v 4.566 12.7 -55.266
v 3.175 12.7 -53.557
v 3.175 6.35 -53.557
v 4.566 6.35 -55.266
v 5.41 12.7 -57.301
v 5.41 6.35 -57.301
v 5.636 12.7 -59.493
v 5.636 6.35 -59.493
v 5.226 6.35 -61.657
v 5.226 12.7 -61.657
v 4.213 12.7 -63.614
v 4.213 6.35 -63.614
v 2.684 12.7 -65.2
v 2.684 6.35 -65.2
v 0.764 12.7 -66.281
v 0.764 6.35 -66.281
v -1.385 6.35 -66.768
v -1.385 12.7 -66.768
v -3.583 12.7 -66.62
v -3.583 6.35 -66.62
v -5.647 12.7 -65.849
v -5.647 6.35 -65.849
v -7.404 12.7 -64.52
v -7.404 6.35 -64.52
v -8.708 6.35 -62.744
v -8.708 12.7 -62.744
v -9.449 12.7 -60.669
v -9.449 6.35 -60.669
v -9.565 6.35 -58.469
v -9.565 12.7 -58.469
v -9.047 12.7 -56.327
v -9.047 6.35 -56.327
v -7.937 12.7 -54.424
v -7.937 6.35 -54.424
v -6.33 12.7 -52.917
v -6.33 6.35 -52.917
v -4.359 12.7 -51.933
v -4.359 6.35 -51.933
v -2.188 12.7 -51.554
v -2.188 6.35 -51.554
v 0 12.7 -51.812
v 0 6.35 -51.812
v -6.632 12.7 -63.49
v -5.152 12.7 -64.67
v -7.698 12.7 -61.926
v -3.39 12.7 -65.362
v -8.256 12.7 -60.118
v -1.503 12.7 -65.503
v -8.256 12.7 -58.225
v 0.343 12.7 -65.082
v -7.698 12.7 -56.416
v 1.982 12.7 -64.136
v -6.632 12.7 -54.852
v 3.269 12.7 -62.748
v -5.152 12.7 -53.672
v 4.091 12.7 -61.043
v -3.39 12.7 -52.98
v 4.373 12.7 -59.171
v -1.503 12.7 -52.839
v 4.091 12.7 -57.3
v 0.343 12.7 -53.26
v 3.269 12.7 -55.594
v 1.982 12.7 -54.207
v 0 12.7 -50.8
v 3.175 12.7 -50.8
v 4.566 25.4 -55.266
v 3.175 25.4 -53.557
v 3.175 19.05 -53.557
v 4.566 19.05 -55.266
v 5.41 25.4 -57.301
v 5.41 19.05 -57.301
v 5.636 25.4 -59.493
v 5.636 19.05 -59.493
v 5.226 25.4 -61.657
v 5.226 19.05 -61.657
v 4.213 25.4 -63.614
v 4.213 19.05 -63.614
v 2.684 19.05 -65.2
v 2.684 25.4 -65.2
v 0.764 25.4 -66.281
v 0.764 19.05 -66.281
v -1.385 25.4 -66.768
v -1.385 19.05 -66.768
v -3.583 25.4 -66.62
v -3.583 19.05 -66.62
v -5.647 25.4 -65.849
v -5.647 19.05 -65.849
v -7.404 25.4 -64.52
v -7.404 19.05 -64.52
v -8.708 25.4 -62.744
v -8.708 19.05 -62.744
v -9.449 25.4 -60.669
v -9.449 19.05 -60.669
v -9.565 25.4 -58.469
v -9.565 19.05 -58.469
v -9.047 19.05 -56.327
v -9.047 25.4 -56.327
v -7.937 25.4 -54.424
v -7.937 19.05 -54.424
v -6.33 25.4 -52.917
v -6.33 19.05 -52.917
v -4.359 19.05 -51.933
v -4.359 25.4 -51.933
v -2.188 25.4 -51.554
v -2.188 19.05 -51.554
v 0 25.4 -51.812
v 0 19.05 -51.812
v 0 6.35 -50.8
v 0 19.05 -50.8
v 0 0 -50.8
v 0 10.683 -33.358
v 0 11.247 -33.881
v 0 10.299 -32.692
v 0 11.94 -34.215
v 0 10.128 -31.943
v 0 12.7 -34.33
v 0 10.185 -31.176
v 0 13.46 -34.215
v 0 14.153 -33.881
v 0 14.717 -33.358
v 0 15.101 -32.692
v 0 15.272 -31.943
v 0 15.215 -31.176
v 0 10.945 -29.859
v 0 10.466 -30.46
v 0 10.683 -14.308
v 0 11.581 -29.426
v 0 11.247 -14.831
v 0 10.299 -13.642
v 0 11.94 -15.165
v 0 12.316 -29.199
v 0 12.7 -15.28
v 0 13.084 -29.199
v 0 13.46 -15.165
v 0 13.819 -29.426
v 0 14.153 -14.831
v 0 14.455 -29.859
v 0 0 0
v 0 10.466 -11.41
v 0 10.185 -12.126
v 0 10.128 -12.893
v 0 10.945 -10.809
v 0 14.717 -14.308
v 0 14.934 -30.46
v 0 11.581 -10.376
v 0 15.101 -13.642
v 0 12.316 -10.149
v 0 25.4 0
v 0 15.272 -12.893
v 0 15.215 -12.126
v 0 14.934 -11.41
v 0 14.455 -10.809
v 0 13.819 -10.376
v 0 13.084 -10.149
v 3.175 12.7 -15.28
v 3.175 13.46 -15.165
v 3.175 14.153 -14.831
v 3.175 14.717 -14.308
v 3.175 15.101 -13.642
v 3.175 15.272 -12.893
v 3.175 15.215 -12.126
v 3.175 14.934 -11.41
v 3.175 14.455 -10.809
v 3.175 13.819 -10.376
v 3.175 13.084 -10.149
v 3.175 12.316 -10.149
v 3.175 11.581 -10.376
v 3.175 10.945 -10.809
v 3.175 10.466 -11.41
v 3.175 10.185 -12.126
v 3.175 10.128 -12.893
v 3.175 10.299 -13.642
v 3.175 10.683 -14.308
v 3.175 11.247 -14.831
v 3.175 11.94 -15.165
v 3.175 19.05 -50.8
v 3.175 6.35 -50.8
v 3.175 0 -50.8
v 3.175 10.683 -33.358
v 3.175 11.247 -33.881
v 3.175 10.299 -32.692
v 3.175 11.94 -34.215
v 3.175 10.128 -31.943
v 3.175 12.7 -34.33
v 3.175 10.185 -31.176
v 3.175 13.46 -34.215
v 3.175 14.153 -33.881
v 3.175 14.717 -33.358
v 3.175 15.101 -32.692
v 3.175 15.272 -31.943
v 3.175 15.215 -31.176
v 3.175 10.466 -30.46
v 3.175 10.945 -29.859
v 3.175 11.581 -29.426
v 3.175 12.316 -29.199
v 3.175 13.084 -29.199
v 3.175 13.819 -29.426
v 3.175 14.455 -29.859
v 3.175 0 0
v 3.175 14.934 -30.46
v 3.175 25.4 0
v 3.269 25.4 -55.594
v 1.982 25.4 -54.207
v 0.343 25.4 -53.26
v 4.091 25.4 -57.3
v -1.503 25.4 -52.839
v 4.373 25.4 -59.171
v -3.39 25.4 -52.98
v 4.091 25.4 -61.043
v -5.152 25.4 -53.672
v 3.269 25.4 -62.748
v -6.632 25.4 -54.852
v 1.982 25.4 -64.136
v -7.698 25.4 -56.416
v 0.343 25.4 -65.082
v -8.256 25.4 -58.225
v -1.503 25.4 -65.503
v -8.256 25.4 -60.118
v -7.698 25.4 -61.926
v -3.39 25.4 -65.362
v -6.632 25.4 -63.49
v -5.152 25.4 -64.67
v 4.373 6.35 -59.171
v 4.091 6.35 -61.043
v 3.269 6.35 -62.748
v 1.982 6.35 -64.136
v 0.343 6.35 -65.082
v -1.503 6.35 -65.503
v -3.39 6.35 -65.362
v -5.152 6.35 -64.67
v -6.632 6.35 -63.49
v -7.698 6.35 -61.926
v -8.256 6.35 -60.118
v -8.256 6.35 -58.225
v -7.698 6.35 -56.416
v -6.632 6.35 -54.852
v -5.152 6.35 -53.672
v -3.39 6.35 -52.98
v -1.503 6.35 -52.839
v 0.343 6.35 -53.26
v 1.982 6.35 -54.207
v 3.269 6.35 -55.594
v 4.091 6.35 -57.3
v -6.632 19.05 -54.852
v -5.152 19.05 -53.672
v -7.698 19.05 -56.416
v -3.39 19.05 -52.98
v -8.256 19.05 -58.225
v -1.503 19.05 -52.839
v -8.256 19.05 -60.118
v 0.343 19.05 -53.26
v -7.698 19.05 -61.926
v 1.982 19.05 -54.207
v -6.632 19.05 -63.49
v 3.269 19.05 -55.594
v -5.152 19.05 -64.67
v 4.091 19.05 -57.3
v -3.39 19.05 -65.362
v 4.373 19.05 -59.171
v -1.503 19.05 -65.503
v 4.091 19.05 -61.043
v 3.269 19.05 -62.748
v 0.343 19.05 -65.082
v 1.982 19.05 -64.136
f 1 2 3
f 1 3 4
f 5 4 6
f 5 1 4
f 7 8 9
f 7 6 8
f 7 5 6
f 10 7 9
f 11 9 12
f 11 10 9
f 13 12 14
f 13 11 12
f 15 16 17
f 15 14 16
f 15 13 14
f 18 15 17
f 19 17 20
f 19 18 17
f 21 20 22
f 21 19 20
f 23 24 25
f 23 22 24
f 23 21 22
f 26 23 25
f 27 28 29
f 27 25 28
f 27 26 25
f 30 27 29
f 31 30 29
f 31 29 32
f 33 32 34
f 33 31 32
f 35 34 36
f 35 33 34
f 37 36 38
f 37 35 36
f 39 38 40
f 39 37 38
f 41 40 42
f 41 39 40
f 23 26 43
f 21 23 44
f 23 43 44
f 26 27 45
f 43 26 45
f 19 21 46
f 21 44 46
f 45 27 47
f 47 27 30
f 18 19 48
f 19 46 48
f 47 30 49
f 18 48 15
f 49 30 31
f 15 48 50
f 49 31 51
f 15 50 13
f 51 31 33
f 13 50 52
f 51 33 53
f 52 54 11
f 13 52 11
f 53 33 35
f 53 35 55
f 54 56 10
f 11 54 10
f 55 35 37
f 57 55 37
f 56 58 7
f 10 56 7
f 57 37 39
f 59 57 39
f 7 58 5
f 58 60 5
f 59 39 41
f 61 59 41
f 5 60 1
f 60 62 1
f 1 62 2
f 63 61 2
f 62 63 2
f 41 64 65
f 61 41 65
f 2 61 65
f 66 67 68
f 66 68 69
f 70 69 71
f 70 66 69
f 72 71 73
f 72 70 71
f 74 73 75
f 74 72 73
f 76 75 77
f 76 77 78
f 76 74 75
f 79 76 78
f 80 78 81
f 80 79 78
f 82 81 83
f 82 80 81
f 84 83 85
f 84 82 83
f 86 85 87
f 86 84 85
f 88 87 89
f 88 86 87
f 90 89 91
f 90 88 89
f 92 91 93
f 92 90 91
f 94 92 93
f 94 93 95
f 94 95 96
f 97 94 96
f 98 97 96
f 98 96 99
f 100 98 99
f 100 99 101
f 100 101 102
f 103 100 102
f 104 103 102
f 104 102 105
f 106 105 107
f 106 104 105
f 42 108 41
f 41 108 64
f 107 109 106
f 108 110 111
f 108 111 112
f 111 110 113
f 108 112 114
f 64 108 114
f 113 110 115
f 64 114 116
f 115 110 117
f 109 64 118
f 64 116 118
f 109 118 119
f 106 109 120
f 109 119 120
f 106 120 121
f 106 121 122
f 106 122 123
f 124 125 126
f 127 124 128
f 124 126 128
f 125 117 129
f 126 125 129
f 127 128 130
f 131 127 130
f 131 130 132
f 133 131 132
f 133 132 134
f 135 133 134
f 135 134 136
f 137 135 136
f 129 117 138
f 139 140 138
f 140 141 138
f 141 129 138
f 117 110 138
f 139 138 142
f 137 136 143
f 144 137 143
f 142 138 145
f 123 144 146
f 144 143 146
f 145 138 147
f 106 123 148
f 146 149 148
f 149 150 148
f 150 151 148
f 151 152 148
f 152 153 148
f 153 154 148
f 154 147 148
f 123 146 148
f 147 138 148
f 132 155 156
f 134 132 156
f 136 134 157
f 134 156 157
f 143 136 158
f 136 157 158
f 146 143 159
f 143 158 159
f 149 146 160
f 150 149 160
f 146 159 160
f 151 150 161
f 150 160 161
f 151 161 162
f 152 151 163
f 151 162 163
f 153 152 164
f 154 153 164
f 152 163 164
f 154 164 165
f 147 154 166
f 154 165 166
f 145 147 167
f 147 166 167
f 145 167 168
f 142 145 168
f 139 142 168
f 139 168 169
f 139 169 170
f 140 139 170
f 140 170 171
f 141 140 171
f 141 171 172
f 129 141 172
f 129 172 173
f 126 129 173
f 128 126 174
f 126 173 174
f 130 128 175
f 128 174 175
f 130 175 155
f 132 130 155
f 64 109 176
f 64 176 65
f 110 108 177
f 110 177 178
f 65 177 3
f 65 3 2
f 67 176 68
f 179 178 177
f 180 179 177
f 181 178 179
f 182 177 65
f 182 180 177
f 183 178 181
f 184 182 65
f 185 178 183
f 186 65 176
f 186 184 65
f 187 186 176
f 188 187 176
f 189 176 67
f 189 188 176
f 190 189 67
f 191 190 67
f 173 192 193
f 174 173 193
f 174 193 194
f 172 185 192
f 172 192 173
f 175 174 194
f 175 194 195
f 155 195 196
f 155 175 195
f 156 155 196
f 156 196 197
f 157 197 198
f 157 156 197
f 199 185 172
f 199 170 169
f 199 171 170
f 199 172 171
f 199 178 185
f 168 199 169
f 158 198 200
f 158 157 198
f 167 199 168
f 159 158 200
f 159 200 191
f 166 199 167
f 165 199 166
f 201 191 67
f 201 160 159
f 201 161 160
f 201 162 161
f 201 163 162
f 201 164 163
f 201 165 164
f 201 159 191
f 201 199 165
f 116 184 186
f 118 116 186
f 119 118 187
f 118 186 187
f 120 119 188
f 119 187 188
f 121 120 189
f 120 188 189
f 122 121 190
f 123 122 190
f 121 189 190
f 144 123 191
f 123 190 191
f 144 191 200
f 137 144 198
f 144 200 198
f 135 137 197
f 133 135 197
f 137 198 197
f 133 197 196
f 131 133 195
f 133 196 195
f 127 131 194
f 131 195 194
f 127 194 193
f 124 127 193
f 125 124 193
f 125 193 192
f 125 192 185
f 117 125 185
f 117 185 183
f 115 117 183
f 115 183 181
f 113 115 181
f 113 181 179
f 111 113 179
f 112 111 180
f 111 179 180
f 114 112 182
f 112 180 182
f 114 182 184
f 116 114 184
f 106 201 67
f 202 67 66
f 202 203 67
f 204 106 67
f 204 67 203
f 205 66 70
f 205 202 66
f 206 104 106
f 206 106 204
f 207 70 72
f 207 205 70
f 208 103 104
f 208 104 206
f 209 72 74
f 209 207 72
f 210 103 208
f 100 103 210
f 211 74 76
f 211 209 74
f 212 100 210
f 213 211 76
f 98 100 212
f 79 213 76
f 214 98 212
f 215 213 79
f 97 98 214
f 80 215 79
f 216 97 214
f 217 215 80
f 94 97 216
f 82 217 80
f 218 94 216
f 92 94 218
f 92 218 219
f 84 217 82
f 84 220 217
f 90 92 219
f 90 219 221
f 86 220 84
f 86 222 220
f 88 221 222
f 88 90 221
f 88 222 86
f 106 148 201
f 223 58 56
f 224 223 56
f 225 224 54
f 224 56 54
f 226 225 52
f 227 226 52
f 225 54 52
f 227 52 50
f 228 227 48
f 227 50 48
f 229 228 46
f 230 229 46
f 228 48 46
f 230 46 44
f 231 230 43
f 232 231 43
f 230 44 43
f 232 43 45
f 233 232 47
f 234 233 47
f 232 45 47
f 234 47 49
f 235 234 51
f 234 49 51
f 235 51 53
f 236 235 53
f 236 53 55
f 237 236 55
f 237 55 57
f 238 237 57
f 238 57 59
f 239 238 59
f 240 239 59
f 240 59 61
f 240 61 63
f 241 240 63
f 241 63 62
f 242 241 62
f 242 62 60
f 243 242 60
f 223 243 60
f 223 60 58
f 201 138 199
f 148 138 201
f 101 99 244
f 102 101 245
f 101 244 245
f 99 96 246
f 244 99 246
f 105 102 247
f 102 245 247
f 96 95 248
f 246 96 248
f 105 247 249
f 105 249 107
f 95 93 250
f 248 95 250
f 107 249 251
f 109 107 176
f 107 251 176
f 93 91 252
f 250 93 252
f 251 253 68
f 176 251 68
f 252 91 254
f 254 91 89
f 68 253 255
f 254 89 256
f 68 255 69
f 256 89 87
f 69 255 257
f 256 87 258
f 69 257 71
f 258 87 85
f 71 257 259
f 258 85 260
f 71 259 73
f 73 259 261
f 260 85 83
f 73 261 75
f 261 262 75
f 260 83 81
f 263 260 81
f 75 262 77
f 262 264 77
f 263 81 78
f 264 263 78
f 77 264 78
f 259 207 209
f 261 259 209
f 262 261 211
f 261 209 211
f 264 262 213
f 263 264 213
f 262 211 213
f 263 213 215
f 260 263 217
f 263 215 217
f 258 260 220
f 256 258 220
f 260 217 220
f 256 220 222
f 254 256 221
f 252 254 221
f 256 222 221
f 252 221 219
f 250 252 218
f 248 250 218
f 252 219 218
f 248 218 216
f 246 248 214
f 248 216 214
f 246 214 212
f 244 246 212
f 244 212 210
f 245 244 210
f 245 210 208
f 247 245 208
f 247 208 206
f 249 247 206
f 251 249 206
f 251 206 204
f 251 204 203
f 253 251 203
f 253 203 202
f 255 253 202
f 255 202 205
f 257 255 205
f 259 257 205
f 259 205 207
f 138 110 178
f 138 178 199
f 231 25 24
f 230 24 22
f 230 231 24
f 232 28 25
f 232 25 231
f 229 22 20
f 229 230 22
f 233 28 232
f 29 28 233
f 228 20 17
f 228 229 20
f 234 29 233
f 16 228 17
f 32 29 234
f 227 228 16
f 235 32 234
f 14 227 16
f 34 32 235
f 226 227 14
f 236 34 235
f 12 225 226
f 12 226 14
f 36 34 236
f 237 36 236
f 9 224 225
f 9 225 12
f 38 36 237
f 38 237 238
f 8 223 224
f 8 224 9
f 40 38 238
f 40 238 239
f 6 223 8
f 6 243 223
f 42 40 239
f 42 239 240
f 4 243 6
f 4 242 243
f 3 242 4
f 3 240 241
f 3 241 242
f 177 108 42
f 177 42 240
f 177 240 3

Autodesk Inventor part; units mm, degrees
ref_plane "YZ Plane" through (0, 0, 0) normal (1, 0, 0) x (0, 1, 0)
ref_plane "XZ Plane" through (0, 0, 0) normal (0, 1, 0) x (-1, 0, 0)
sketch "Sketch1" plane through (0, 0, 0) normal (1, 0, 0) x (0, 1, 0)
  line L0 (0, 0) -> (25.4, 0)
  line L1 (25.4, 0) -> (25.4, -50.8)
  line L2 (25.4, -50.8) -> (0, -50.8)
  line L3 (0, -50.8) -> (0, 0)
  dimension "d0" = 25.4
  dimension "d1" = 50.8
extrude "Extrusion1" add sketch "Sketch1" along normal blind 3.175
sketch "Sketch2" plane through (0, 25.4, 0) normal (0, 1, 0) x (1, 0, 0)
  line L0 (0, 50.8) -> (3.175, 50.8) projected
  arc A0 (3.175, 53.557) -> (0, 51.8122) centre (-1.9772, 59.1712) ccw
  line L1 (0, 50.8) -> (0, 0) projected
  line L2 (0, 50.8) -> (0, 51.8122)
  line L3 (3.175, 50.8) -> (3.175, 53.557)
  dimension "d4" = 15.24
extrude "Extrusion2" add sketch "Sketch2" against normal blind 6.35
ref_plane "Work Plane1" through (0, 12.7, 0) normal (0, -1, 0) x (1, 0, 0)
sketch "Sketch3" plane through (0, 12.7, 0) normal (0, -1, 0) x (1, 0, 0)
  arc A0 (0, -51.8122) -> (3.175, -53.557) centre (-1.9772, -59.1712) ccw projected
  line L0 (3.175, -53.557) -> (3.175, -50.8) projected
  line L1 (0, -50.8) -> (3.175, -50.8) projected
  line L2 (0, -50.8) -> (0, -51.8122) projected
  point P0 (0, 0)
extrude "Extrusion3" add sketch "Sketch3" along normal blind 6.35
sketch "Sketch4" plane through (0, 25.4, 0) normal (0, 1, 0) x (1, 0, 0)
  arc A0 (3.175, 53.557) -> (0, 51.8122) centre (-1.9772, 59.1712) ccw projected
  circle A1 centre (-1.9772, 59.1712) radius 6.35
  point P0 (0, 0)
  dimension "d10" = 12.7
extrude "Extrusion4" cut sketch "Sketch4" against normal blind 127
sketch "Sketch5" plane through (3.175, 0, 0) normal (1, 0, 0) x (0, 0, -1)
  line L0 (0, 25.4) -> (0, 0) construction
  line L1 (0, 12.7) -> (12.7, 12.7) construction
  line L2 (12.7, 12.7) -> (31.75, 12.7) construction
  circle A0 centre (12.7, 12.7) radius 2.5797
  circle A1 centre (31.75, 12.7) radius 2.5797
  dimension "d13" = 12.7
  dimension "d14" = 19.05
  dimension "d15" = 5.1594
  dimension "d16" = 5.1594
extrude "Extrusion5" cut sketch "Sketch5" against normal blind 127
properties part number "hinge half"
